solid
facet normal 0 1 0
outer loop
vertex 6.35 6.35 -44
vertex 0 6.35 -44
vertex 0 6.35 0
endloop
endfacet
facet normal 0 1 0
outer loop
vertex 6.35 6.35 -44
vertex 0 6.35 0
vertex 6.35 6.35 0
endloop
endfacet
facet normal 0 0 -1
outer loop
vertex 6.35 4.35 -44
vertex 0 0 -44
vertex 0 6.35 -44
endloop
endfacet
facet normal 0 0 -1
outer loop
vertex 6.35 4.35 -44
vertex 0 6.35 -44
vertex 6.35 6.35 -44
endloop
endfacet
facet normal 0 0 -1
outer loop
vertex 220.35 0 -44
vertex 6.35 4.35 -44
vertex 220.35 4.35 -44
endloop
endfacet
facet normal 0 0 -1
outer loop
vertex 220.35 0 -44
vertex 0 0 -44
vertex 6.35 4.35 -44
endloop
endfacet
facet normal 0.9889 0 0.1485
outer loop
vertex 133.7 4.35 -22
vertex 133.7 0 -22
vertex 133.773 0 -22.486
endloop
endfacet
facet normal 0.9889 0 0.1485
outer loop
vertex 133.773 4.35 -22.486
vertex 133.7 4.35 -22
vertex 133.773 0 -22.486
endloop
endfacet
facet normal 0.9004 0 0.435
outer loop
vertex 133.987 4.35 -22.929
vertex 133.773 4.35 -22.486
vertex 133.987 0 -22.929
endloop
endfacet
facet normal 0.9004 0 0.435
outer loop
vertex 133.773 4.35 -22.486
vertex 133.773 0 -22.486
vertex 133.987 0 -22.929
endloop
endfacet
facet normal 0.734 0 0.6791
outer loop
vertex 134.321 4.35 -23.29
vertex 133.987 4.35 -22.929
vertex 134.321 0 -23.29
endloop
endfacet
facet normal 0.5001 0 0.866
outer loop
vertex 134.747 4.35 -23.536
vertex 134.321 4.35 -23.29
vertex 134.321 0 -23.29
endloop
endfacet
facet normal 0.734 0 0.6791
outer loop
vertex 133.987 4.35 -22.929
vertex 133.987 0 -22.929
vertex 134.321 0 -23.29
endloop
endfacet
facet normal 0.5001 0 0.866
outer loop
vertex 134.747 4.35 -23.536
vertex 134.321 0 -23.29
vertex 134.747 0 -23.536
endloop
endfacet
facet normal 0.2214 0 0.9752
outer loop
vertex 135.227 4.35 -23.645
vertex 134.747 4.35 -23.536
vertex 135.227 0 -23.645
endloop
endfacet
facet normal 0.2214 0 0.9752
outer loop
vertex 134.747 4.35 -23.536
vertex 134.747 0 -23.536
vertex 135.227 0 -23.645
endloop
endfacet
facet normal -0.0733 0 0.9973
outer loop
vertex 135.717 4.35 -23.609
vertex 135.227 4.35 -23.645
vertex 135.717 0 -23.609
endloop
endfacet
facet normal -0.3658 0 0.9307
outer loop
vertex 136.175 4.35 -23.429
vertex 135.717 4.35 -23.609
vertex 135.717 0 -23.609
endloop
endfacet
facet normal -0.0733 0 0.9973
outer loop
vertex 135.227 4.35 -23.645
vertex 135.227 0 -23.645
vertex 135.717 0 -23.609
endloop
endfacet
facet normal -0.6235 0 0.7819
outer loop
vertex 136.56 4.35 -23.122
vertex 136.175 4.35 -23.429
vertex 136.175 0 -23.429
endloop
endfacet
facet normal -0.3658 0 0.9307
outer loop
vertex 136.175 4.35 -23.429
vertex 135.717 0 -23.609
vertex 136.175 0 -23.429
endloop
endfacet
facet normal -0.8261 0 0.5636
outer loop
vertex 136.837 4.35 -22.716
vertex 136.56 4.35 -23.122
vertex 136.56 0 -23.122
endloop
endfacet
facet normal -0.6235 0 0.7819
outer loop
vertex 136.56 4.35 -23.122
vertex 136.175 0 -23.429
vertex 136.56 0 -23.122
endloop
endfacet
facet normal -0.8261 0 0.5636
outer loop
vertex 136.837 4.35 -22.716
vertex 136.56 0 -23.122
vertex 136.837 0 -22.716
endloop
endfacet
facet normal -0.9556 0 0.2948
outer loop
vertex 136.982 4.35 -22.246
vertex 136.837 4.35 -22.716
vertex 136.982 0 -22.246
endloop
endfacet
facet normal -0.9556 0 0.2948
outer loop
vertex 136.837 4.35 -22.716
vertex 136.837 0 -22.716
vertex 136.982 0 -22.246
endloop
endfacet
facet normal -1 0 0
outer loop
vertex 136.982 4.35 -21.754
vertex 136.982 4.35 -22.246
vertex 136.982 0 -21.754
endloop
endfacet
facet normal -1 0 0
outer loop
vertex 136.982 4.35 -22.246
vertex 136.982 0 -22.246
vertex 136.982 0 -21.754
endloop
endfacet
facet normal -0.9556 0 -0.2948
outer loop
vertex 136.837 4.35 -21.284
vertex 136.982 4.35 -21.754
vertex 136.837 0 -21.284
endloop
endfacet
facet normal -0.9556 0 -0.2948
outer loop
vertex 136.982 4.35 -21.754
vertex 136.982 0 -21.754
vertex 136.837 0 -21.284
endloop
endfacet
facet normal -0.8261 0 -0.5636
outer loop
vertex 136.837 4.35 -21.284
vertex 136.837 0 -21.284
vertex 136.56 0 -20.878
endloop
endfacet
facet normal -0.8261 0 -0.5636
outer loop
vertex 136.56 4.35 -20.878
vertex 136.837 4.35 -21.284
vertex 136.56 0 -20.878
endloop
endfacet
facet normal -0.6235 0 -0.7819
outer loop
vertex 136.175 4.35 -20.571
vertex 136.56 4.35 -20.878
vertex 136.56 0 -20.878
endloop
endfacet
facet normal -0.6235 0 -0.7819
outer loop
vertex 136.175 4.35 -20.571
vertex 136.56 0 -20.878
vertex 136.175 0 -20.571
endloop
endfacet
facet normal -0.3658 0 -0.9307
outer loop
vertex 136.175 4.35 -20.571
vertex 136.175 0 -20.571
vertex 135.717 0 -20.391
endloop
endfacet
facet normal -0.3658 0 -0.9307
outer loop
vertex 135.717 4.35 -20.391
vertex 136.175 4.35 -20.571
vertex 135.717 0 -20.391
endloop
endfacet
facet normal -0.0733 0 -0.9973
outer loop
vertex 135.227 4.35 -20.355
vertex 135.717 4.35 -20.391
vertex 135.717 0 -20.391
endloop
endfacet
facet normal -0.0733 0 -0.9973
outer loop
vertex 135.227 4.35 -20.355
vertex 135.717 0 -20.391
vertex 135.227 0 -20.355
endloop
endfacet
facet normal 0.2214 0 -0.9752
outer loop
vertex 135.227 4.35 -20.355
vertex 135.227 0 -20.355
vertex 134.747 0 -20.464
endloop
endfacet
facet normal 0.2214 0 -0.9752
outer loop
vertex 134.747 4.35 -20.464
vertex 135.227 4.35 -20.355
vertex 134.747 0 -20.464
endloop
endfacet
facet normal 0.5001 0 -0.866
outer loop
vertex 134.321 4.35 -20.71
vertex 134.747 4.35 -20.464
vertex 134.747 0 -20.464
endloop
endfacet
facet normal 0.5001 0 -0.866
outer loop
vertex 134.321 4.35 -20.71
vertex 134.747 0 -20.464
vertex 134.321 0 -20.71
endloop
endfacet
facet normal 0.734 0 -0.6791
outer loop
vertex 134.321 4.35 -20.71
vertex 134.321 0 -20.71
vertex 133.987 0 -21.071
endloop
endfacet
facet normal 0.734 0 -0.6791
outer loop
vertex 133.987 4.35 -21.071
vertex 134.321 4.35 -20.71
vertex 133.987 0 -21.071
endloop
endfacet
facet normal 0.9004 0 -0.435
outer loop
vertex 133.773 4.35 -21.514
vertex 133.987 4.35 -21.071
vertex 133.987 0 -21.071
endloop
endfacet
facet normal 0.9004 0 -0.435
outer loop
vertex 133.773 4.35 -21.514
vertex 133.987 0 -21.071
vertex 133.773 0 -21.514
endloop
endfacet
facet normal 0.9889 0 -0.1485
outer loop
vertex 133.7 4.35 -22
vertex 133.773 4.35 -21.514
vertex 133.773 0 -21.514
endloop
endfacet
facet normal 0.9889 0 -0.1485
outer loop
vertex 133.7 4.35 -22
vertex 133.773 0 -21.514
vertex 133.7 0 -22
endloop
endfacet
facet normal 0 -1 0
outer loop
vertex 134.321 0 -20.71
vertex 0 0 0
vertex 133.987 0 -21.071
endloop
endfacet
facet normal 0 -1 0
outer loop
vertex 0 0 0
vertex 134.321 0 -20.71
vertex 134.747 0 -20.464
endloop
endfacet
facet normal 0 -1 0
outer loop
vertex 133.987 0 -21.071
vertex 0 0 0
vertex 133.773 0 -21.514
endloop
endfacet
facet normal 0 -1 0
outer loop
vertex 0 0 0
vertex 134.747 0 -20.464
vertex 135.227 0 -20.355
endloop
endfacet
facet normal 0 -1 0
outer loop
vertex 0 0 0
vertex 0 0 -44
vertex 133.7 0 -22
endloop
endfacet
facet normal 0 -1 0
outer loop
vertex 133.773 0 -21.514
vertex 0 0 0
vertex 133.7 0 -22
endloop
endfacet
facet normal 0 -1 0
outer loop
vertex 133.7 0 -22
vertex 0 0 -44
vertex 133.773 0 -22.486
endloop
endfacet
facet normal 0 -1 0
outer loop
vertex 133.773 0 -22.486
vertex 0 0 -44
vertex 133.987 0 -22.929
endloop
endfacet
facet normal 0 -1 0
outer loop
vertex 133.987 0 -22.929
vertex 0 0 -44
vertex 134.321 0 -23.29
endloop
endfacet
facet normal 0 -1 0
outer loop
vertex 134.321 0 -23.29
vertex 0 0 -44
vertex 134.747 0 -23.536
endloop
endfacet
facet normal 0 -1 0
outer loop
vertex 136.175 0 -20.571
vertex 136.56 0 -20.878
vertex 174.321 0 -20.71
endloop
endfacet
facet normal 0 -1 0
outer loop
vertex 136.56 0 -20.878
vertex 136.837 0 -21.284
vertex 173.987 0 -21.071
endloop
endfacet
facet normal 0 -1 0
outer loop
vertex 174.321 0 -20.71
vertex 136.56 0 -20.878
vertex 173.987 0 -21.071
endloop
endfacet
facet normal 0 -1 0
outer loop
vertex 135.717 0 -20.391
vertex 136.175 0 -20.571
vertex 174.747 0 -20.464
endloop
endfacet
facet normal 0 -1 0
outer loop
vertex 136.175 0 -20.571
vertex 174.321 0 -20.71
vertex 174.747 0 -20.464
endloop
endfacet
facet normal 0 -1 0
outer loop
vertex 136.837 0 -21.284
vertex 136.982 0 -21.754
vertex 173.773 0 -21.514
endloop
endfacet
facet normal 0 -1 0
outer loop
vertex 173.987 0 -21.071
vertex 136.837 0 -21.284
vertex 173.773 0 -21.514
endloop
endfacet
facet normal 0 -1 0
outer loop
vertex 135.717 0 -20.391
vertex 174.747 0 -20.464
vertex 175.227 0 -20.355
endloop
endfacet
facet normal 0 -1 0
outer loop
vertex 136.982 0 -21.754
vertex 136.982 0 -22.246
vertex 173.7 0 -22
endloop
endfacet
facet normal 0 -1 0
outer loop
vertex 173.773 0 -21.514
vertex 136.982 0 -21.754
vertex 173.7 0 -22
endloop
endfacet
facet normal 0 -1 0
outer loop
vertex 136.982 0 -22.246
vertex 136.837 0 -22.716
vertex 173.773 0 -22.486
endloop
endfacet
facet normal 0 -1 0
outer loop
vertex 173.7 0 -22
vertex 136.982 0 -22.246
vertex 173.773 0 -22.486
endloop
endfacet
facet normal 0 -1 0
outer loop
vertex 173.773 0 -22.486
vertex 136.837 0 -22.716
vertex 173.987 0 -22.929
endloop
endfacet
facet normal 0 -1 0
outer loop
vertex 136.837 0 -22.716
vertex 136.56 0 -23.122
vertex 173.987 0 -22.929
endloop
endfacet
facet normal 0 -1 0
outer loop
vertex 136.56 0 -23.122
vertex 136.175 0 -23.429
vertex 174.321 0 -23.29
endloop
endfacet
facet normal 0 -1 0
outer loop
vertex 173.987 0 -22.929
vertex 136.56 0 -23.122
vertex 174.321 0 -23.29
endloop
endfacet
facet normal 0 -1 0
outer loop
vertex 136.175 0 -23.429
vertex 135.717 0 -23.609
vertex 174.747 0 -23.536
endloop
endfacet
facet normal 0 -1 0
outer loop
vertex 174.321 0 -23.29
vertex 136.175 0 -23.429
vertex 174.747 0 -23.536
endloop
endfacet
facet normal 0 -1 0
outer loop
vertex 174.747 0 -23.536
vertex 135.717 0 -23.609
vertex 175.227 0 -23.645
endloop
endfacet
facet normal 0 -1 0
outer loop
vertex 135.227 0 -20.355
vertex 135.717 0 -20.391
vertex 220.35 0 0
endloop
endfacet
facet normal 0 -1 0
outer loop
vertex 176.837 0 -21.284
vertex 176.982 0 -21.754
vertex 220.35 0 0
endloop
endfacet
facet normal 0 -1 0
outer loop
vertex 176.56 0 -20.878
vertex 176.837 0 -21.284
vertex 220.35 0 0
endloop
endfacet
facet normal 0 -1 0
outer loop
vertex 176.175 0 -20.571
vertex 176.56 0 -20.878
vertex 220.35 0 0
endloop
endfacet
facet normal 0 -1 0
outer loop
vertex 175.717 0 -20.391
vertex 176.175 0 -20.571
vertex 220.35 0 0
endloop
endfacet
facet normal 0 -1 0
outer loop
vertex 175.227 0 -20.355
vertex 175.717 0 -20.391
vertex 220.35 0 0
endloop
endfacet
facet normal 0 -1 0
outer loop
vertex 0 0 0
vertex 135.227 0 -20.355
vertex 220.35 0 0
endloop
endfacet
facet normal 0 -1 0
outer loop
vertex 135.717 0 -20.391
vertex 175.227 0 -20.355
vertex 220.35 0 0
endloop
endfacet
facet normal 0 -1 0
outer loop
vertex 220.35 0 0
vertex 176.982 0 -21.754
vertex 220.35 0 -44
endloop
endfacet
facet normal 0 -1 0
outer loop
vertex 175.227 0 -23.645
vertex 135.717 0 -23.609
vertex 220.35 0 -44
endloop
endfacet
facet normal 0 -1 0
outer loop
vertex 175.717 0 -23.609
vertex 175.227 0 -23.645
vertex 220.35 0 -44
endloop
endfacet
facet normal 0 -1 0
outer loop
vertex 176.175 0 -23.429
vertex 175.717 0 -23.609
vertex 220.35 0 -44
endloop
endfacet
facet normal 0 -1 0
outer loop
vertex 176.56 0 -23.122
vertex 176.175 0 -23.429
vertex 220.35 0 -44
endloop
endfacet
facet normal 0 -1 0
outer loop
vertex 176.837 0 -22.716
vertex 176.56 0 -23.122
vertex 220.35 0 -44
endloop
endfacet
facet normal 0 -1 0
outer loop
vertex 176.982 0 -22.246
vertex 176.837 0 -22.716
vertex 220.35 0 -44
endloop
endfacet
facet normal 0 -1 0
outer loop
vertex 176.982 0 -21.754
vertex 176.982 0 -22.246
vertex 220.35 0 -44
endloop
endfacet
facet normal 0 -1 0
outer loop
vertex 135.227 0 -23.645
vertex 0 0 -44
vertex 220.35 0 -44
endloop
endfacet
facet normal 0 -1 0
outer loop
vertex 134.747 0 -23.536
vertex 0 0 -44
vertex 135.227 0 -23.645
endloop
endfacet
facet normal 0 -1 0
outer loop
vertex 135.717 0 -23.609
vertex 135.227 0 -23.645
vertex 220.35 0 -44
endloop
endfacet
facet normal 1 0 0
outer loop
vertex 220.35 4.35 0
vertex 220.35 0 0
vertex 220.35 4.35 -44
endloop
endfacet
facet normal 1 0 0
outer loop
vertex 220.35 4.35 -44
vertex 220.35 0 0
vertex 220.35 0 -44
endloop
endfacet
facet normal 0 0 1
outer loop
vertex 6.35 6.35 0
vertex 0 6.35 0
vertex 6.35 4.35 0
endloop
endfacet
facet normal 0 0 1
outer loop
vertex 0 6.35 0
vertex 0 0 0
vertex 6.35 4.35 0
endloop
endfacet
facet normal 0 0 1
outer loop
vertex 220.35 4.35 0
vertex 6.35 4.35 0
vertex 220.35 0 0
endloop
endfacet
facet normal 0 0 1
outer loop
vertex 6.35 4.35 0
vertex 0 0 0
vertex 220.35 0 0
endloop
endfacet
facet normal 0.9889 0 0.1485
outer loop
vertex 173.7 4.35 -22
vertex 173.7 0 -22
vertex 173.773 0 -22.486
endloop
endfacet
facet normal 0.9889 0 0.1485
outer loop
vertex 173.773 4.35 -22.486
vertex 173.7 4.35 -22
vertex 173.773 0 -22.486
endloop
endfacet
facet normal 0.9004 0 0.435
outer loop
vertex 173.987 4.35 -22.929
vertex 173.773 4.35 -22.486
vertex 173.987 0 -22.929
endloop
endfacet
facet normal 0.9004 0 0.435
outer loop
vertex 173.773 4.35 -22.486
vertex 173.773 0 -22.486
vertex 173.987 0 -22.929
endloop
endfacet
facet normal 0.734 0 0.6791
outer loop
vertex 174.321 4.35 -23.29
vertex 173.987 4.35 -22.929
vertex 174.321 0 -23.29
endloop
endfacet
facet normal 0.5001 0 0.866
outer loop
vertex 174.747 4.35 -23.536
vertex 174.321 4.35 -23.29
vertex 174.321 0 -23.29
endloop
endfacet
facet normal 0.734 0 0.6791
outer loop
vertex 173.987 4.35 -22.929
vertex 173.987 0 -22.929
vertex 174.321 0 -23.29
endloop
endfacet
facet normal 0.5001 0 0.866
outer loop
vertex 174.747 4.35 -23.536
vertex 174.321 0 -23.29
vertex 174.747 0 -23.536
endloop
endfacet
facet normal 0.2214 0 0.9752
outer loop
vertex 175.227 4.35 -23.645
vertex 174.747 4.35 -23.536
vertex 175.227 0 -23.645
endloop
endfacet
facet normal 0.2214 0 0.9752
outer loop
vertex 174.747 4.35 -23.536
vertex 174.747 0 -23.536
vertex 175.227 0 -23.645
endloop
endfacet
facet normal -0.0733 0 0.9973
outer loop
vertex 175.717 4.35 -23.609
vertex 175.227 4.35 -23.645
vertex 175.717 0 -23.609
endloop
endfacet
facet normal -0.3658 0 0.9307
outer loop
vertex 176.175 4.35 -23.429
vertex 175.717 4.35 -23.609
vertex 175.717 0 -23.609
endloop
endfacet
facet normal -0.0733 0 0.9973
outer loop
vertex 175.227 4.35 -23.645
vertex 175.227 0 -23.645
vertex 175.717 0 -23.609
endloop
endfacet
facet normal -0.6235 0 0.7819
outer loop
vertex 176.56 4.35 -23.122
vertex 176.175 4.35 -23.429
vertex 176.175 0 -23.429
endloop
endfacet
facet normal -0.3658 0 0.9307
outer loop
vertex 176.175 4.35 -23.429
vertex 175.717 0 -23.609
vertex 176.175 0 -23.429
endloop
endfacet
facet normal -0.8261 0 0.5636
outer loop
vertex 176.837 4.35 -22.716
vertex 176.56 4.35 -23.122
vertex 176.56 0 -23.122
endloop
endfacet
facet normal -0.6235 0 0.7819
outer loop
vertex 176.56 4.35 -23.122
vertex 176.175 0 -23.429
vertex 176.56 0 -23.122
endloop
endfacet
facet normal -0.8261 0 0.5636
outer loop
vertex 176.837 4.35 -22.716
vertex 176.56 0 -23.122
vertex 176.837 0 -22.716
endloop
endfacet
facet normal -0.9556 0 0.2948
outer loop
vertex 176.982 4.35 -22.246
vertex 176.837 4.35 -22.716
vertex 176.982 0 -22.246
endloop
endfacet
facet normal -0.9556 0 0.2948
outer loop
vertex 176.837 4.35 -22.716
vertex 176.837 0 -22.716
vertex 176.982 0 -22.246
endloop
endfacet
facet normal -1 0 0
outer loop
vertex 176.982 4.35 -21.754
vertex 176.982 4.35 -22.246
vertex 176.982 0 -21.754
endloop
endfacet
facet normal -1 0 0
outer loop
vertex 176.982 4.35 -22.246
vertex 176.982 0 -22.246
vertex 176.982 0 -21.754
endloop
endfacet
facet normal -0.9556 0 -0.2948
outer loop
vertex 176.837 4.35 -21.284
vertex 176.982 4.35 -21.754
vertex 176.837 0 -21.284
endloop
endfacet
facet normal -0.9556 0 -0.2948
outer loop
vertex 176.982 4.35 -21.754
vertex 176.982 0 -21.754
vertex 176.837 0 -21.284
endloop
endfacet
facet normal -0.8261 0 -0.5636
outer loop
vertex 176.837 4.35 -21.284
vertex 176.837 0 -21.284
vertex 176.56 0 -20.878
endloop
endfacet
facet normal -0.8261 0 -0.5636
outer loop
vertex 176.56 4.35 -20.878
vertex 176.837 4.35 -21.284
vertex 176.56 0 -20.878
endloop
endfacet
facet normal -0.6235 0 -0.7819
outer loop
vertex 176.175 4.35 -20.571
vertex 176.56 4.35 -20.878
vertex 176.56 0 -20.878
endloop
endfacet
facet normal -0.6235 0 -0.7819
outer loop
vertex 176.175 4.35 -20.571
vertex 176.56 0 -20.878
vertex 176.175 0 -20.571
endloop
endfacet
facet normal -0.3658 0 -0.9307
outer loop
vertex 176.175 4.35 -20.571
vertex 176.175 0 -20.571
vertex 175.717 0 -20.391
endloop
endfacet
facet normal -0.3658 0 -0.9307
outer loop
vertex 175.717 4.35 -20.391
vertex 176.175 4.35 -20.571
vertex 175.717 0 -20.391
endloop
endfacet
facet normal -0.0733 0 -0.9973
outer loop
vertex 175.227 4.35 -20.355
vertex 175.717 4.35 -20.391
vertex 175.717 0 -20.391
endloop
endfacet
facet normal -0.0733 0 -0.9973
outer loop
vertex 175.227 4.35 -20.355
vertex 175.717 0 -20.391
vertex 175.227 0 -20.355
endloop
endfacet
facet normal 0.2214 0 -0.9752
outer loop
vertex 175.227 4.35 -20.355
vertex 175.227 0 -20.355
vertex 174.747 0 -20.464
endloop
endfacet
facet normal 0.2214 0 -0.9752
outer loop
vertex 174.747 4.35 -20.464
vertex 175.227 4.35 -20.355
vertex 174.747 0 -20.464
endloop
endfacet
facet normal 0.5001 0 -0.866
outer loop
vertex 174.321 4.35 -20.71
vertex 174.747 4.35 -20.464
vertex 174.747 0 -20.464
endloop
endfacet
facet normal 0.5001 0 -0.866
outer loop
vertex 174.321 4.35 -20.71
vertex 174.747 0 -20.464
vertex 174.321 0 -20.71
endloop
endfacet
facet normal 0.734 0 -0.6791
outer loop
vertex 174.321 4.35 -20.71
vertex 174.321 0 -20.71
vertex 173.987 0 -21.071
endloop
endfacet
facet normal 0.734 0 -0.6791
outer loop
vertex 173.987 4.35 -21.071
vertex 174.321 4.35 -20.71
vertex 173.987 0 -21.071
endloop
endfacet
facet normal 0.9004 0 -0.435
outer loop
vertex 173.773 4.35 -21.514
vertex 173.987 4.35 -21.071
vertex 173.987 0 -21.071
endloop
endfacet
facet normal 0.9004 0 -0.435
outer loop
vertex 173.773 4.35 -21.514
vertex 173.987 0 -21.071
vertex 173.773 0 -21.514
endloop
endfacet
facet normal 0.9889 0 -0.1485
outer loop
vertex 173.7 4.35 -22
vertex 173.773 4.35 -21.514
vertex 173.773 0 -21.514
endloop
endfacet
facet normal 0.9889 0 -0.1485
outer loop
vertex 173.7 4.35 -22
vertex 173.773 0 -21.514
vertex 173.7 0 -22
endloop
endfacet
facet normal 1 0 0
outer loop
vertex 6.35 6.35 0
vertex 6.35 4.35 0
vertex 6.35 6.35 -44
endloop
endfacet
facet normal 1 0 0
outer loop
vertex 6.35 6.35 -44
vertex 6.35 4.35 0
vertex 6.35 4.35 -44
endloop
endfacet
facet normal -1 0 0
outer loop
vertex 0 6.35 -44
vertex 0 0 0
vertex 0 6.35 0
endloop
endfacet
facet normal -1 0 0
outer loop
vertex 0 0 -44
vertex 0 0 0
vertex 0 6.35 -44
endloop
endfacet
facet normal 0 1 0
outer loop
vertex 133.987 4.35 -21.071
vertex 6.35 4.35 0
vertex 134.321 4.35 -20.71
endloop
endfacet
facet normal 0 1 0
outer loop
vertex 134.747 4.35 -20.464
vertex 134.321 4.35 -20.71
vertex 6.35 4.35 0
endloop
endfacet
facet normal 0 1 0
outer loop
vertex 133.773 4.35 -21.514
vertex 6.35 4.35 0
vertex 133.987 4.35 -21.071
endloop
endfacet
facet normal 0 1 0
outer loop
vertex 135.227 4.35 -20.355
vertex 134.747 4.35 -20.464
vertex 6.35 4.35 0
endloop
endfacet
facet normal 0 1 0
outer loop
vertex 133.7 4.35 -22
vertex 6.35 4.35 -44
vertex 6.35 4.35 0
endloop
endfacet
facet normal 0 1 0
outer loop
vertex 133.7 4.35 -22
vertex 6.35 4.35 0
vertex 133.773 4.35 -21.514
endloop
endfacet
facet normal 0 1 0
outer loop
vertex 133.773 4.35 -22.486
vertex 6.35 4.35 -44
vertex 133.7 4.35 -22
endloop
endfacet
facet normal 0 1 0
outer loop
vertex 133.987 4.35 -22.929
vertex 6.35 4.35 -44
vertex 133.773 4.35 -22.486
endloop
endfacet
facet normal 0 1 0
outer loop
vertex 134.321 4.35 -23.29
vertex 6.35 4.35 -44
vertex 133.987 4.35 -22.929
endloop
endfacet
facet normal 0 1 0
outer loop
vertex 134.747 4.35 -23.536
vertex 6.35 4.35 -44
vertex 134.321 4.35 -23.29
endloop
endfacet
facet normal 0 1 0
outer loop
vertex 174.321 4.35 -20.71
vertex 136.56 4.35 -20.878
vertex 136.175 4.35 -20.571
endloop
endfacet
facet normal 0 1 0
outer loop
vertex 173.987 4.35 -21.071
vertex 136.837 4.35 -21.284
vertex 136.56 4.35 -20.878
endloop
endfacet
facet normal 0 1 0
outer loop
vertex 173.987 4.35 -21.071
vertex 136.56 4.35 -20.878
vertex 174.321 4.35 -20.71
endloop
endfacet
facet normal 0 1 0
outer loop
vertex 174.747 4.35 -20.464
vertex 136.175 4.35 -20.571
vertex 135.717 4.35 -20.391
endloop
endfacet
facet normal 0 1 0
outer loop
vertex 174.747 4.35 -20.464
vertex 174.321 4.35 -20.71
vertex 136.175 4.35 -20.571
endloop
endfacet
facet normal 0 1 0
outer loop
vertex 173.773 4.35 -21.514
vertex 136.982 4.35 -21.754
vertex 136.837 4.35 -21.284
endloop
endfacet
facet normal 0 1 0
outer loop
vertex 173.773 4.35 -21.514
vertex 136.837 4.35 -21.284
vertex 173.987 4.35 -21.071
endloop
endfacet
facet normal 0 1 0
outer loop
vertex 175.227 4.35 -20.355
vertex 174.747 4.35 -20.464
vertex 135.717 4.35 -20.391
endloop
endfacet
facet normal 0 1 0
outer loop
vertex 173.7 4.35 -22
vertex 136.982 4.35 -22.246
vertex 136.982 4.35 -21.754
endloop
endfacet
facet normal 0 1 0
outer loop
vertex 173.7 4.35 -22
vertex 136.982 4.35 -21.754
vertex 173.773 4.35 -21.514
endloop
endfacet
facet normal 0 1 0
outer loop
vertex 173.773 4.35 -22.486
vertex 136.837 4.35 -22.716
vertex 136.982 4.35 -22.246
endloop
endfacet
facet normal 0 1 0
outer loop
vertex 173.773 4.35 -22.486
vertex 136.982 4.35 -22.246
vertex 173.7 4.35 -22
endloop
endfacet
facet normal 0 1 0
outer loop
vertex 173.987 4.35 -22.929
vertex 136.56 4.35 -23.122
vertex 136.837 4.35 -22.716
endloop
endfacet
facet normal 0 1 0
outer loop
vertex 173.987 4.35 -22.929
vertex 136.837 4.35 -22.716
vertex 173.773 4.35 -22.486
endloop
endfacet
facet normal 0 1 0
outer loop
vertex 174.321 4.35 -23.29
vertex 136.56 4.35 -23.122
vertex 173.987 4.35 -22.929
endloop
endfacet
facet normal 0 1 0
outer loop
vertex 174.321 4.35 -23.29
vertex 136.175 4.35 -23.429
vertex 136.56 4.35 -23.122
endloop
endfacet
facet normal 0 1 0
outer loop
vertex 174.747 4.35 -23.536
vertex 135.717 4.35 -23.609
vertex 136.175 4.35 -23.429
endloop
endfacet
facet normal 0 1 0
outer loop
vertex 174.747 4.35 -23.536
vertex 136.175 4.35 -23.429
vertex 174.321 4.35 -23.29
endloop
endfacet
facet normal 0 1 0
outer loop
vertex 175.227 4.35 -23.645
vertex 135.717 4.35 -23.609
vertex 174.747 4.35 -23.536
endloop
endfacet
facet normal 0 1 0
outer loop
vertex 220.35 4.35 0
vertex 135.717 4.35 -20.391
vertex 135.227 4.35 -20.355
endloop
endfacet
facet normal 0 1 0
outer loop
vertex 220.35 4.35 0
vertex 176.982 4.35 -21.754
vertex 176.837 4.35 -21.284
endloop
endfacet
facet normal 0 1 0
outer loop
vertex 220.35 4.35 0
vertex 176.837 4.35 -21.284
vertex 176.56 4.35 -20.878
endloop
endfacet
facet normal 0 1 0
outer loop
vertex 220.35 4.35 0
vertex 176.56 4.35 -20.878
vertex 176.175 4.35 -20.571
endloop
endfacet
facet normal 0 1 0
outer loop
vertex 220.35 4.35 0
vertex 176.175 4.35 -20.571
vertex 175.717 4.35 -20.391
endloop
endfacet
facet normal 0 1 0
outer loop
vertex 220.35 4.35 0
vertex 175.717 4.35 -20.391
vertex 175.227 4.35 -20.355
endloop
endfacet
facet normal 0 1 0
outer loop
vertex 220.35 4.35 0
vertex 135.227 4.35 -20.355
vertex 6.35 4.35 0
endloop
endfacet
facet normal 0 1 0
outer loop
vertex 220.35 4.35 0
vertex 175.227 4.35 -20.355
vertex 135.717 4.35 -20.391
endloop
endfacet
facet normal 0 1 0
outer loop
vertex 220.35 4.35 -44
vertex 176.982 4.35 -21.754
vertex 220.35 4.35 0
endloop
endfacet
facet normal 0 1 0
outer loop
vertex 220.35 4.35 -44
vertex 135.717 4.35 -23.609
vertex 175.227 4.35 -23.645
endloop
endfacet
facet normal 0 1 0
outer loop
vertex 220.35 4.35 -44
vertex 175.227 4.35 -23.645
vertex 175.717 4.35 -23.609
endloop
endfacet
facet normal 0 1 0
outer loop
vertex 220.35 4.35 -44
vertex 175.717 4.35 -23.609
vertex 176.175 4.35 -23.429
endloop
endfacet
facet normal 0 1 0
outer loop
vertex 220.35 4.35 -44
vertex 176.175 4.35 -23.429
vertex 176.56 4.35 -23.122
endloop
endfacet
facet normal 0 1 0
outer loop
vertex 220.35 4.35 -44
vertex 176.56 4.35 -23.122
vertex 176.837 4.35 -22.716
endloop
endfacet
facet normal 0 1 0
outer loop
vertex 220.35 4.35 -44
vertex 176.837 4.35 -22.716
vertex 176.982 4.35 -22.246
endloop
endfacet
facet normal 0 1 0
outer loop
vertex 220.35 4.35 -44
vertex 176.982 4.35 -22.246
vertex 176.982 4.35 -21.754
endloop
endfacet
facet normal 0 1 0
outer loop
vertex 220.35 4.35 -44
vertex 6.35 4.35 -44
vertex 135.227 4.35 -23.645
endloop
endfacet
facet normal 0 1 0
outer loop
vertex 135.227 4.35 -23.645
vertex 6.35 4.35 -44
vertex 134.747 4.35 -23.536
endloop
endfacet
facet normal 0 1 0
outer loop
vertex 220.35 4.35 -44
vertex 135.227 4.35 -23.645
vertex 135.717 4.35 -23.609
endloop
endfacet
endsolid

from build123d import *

# Parameters (mm, degrees)
SKETCH1_W             = 220.35
SKETCH1_H             = 44
BOSS_EXTRUDE1_DEPTH   = 4.35
SKETCH2_W             = 6.35
SKETCH2_H             = 44
BOSS_EXTRUDE2_DEPTH   = 2
M4X0_7_TAPPED_HOLE2_D = 3.3


with BuildPart() as part:
    # Sketch1 → Boss-Extrude1 (new body)
    with BuildSketch(Plane(origin=(0, 0, 0), x_dir=(1, 0, 0), z_dir=(0, 1, 0))):
        with Locations((110.175, 22)):
            Rectangle(SKETCH1_W, SKETCH1_H)
    extrude(amount=BOSS_EXTRUDE1_DEPTH)

    # Sketch2 → Boss-Extrude2 (add)
    with BuildSketch(Plane(origin=(0, 4.35, 0), x_dir=(1, 0, 0), z_dir=(0, 1, 0))):
        with Locations((3.175, 22)):
            Rectangle(SKETCH2_W, SKETCH2_H)
    extrude(amount=BOSS_EXTRUDE2_DEPTH)

    # M4x0.7 Tapped Hole2 (through all)
    with Locations(Plane(origin=(0, 4.35, 0), x_dir=(1, 0, 0), z_dir=(0, 1, 0))):
        with Locations((135.35, 22), (175.35, 22)):
            Hole(M4X0_7_TAPPED_HOLE2_D / 2)


solid = part.part
